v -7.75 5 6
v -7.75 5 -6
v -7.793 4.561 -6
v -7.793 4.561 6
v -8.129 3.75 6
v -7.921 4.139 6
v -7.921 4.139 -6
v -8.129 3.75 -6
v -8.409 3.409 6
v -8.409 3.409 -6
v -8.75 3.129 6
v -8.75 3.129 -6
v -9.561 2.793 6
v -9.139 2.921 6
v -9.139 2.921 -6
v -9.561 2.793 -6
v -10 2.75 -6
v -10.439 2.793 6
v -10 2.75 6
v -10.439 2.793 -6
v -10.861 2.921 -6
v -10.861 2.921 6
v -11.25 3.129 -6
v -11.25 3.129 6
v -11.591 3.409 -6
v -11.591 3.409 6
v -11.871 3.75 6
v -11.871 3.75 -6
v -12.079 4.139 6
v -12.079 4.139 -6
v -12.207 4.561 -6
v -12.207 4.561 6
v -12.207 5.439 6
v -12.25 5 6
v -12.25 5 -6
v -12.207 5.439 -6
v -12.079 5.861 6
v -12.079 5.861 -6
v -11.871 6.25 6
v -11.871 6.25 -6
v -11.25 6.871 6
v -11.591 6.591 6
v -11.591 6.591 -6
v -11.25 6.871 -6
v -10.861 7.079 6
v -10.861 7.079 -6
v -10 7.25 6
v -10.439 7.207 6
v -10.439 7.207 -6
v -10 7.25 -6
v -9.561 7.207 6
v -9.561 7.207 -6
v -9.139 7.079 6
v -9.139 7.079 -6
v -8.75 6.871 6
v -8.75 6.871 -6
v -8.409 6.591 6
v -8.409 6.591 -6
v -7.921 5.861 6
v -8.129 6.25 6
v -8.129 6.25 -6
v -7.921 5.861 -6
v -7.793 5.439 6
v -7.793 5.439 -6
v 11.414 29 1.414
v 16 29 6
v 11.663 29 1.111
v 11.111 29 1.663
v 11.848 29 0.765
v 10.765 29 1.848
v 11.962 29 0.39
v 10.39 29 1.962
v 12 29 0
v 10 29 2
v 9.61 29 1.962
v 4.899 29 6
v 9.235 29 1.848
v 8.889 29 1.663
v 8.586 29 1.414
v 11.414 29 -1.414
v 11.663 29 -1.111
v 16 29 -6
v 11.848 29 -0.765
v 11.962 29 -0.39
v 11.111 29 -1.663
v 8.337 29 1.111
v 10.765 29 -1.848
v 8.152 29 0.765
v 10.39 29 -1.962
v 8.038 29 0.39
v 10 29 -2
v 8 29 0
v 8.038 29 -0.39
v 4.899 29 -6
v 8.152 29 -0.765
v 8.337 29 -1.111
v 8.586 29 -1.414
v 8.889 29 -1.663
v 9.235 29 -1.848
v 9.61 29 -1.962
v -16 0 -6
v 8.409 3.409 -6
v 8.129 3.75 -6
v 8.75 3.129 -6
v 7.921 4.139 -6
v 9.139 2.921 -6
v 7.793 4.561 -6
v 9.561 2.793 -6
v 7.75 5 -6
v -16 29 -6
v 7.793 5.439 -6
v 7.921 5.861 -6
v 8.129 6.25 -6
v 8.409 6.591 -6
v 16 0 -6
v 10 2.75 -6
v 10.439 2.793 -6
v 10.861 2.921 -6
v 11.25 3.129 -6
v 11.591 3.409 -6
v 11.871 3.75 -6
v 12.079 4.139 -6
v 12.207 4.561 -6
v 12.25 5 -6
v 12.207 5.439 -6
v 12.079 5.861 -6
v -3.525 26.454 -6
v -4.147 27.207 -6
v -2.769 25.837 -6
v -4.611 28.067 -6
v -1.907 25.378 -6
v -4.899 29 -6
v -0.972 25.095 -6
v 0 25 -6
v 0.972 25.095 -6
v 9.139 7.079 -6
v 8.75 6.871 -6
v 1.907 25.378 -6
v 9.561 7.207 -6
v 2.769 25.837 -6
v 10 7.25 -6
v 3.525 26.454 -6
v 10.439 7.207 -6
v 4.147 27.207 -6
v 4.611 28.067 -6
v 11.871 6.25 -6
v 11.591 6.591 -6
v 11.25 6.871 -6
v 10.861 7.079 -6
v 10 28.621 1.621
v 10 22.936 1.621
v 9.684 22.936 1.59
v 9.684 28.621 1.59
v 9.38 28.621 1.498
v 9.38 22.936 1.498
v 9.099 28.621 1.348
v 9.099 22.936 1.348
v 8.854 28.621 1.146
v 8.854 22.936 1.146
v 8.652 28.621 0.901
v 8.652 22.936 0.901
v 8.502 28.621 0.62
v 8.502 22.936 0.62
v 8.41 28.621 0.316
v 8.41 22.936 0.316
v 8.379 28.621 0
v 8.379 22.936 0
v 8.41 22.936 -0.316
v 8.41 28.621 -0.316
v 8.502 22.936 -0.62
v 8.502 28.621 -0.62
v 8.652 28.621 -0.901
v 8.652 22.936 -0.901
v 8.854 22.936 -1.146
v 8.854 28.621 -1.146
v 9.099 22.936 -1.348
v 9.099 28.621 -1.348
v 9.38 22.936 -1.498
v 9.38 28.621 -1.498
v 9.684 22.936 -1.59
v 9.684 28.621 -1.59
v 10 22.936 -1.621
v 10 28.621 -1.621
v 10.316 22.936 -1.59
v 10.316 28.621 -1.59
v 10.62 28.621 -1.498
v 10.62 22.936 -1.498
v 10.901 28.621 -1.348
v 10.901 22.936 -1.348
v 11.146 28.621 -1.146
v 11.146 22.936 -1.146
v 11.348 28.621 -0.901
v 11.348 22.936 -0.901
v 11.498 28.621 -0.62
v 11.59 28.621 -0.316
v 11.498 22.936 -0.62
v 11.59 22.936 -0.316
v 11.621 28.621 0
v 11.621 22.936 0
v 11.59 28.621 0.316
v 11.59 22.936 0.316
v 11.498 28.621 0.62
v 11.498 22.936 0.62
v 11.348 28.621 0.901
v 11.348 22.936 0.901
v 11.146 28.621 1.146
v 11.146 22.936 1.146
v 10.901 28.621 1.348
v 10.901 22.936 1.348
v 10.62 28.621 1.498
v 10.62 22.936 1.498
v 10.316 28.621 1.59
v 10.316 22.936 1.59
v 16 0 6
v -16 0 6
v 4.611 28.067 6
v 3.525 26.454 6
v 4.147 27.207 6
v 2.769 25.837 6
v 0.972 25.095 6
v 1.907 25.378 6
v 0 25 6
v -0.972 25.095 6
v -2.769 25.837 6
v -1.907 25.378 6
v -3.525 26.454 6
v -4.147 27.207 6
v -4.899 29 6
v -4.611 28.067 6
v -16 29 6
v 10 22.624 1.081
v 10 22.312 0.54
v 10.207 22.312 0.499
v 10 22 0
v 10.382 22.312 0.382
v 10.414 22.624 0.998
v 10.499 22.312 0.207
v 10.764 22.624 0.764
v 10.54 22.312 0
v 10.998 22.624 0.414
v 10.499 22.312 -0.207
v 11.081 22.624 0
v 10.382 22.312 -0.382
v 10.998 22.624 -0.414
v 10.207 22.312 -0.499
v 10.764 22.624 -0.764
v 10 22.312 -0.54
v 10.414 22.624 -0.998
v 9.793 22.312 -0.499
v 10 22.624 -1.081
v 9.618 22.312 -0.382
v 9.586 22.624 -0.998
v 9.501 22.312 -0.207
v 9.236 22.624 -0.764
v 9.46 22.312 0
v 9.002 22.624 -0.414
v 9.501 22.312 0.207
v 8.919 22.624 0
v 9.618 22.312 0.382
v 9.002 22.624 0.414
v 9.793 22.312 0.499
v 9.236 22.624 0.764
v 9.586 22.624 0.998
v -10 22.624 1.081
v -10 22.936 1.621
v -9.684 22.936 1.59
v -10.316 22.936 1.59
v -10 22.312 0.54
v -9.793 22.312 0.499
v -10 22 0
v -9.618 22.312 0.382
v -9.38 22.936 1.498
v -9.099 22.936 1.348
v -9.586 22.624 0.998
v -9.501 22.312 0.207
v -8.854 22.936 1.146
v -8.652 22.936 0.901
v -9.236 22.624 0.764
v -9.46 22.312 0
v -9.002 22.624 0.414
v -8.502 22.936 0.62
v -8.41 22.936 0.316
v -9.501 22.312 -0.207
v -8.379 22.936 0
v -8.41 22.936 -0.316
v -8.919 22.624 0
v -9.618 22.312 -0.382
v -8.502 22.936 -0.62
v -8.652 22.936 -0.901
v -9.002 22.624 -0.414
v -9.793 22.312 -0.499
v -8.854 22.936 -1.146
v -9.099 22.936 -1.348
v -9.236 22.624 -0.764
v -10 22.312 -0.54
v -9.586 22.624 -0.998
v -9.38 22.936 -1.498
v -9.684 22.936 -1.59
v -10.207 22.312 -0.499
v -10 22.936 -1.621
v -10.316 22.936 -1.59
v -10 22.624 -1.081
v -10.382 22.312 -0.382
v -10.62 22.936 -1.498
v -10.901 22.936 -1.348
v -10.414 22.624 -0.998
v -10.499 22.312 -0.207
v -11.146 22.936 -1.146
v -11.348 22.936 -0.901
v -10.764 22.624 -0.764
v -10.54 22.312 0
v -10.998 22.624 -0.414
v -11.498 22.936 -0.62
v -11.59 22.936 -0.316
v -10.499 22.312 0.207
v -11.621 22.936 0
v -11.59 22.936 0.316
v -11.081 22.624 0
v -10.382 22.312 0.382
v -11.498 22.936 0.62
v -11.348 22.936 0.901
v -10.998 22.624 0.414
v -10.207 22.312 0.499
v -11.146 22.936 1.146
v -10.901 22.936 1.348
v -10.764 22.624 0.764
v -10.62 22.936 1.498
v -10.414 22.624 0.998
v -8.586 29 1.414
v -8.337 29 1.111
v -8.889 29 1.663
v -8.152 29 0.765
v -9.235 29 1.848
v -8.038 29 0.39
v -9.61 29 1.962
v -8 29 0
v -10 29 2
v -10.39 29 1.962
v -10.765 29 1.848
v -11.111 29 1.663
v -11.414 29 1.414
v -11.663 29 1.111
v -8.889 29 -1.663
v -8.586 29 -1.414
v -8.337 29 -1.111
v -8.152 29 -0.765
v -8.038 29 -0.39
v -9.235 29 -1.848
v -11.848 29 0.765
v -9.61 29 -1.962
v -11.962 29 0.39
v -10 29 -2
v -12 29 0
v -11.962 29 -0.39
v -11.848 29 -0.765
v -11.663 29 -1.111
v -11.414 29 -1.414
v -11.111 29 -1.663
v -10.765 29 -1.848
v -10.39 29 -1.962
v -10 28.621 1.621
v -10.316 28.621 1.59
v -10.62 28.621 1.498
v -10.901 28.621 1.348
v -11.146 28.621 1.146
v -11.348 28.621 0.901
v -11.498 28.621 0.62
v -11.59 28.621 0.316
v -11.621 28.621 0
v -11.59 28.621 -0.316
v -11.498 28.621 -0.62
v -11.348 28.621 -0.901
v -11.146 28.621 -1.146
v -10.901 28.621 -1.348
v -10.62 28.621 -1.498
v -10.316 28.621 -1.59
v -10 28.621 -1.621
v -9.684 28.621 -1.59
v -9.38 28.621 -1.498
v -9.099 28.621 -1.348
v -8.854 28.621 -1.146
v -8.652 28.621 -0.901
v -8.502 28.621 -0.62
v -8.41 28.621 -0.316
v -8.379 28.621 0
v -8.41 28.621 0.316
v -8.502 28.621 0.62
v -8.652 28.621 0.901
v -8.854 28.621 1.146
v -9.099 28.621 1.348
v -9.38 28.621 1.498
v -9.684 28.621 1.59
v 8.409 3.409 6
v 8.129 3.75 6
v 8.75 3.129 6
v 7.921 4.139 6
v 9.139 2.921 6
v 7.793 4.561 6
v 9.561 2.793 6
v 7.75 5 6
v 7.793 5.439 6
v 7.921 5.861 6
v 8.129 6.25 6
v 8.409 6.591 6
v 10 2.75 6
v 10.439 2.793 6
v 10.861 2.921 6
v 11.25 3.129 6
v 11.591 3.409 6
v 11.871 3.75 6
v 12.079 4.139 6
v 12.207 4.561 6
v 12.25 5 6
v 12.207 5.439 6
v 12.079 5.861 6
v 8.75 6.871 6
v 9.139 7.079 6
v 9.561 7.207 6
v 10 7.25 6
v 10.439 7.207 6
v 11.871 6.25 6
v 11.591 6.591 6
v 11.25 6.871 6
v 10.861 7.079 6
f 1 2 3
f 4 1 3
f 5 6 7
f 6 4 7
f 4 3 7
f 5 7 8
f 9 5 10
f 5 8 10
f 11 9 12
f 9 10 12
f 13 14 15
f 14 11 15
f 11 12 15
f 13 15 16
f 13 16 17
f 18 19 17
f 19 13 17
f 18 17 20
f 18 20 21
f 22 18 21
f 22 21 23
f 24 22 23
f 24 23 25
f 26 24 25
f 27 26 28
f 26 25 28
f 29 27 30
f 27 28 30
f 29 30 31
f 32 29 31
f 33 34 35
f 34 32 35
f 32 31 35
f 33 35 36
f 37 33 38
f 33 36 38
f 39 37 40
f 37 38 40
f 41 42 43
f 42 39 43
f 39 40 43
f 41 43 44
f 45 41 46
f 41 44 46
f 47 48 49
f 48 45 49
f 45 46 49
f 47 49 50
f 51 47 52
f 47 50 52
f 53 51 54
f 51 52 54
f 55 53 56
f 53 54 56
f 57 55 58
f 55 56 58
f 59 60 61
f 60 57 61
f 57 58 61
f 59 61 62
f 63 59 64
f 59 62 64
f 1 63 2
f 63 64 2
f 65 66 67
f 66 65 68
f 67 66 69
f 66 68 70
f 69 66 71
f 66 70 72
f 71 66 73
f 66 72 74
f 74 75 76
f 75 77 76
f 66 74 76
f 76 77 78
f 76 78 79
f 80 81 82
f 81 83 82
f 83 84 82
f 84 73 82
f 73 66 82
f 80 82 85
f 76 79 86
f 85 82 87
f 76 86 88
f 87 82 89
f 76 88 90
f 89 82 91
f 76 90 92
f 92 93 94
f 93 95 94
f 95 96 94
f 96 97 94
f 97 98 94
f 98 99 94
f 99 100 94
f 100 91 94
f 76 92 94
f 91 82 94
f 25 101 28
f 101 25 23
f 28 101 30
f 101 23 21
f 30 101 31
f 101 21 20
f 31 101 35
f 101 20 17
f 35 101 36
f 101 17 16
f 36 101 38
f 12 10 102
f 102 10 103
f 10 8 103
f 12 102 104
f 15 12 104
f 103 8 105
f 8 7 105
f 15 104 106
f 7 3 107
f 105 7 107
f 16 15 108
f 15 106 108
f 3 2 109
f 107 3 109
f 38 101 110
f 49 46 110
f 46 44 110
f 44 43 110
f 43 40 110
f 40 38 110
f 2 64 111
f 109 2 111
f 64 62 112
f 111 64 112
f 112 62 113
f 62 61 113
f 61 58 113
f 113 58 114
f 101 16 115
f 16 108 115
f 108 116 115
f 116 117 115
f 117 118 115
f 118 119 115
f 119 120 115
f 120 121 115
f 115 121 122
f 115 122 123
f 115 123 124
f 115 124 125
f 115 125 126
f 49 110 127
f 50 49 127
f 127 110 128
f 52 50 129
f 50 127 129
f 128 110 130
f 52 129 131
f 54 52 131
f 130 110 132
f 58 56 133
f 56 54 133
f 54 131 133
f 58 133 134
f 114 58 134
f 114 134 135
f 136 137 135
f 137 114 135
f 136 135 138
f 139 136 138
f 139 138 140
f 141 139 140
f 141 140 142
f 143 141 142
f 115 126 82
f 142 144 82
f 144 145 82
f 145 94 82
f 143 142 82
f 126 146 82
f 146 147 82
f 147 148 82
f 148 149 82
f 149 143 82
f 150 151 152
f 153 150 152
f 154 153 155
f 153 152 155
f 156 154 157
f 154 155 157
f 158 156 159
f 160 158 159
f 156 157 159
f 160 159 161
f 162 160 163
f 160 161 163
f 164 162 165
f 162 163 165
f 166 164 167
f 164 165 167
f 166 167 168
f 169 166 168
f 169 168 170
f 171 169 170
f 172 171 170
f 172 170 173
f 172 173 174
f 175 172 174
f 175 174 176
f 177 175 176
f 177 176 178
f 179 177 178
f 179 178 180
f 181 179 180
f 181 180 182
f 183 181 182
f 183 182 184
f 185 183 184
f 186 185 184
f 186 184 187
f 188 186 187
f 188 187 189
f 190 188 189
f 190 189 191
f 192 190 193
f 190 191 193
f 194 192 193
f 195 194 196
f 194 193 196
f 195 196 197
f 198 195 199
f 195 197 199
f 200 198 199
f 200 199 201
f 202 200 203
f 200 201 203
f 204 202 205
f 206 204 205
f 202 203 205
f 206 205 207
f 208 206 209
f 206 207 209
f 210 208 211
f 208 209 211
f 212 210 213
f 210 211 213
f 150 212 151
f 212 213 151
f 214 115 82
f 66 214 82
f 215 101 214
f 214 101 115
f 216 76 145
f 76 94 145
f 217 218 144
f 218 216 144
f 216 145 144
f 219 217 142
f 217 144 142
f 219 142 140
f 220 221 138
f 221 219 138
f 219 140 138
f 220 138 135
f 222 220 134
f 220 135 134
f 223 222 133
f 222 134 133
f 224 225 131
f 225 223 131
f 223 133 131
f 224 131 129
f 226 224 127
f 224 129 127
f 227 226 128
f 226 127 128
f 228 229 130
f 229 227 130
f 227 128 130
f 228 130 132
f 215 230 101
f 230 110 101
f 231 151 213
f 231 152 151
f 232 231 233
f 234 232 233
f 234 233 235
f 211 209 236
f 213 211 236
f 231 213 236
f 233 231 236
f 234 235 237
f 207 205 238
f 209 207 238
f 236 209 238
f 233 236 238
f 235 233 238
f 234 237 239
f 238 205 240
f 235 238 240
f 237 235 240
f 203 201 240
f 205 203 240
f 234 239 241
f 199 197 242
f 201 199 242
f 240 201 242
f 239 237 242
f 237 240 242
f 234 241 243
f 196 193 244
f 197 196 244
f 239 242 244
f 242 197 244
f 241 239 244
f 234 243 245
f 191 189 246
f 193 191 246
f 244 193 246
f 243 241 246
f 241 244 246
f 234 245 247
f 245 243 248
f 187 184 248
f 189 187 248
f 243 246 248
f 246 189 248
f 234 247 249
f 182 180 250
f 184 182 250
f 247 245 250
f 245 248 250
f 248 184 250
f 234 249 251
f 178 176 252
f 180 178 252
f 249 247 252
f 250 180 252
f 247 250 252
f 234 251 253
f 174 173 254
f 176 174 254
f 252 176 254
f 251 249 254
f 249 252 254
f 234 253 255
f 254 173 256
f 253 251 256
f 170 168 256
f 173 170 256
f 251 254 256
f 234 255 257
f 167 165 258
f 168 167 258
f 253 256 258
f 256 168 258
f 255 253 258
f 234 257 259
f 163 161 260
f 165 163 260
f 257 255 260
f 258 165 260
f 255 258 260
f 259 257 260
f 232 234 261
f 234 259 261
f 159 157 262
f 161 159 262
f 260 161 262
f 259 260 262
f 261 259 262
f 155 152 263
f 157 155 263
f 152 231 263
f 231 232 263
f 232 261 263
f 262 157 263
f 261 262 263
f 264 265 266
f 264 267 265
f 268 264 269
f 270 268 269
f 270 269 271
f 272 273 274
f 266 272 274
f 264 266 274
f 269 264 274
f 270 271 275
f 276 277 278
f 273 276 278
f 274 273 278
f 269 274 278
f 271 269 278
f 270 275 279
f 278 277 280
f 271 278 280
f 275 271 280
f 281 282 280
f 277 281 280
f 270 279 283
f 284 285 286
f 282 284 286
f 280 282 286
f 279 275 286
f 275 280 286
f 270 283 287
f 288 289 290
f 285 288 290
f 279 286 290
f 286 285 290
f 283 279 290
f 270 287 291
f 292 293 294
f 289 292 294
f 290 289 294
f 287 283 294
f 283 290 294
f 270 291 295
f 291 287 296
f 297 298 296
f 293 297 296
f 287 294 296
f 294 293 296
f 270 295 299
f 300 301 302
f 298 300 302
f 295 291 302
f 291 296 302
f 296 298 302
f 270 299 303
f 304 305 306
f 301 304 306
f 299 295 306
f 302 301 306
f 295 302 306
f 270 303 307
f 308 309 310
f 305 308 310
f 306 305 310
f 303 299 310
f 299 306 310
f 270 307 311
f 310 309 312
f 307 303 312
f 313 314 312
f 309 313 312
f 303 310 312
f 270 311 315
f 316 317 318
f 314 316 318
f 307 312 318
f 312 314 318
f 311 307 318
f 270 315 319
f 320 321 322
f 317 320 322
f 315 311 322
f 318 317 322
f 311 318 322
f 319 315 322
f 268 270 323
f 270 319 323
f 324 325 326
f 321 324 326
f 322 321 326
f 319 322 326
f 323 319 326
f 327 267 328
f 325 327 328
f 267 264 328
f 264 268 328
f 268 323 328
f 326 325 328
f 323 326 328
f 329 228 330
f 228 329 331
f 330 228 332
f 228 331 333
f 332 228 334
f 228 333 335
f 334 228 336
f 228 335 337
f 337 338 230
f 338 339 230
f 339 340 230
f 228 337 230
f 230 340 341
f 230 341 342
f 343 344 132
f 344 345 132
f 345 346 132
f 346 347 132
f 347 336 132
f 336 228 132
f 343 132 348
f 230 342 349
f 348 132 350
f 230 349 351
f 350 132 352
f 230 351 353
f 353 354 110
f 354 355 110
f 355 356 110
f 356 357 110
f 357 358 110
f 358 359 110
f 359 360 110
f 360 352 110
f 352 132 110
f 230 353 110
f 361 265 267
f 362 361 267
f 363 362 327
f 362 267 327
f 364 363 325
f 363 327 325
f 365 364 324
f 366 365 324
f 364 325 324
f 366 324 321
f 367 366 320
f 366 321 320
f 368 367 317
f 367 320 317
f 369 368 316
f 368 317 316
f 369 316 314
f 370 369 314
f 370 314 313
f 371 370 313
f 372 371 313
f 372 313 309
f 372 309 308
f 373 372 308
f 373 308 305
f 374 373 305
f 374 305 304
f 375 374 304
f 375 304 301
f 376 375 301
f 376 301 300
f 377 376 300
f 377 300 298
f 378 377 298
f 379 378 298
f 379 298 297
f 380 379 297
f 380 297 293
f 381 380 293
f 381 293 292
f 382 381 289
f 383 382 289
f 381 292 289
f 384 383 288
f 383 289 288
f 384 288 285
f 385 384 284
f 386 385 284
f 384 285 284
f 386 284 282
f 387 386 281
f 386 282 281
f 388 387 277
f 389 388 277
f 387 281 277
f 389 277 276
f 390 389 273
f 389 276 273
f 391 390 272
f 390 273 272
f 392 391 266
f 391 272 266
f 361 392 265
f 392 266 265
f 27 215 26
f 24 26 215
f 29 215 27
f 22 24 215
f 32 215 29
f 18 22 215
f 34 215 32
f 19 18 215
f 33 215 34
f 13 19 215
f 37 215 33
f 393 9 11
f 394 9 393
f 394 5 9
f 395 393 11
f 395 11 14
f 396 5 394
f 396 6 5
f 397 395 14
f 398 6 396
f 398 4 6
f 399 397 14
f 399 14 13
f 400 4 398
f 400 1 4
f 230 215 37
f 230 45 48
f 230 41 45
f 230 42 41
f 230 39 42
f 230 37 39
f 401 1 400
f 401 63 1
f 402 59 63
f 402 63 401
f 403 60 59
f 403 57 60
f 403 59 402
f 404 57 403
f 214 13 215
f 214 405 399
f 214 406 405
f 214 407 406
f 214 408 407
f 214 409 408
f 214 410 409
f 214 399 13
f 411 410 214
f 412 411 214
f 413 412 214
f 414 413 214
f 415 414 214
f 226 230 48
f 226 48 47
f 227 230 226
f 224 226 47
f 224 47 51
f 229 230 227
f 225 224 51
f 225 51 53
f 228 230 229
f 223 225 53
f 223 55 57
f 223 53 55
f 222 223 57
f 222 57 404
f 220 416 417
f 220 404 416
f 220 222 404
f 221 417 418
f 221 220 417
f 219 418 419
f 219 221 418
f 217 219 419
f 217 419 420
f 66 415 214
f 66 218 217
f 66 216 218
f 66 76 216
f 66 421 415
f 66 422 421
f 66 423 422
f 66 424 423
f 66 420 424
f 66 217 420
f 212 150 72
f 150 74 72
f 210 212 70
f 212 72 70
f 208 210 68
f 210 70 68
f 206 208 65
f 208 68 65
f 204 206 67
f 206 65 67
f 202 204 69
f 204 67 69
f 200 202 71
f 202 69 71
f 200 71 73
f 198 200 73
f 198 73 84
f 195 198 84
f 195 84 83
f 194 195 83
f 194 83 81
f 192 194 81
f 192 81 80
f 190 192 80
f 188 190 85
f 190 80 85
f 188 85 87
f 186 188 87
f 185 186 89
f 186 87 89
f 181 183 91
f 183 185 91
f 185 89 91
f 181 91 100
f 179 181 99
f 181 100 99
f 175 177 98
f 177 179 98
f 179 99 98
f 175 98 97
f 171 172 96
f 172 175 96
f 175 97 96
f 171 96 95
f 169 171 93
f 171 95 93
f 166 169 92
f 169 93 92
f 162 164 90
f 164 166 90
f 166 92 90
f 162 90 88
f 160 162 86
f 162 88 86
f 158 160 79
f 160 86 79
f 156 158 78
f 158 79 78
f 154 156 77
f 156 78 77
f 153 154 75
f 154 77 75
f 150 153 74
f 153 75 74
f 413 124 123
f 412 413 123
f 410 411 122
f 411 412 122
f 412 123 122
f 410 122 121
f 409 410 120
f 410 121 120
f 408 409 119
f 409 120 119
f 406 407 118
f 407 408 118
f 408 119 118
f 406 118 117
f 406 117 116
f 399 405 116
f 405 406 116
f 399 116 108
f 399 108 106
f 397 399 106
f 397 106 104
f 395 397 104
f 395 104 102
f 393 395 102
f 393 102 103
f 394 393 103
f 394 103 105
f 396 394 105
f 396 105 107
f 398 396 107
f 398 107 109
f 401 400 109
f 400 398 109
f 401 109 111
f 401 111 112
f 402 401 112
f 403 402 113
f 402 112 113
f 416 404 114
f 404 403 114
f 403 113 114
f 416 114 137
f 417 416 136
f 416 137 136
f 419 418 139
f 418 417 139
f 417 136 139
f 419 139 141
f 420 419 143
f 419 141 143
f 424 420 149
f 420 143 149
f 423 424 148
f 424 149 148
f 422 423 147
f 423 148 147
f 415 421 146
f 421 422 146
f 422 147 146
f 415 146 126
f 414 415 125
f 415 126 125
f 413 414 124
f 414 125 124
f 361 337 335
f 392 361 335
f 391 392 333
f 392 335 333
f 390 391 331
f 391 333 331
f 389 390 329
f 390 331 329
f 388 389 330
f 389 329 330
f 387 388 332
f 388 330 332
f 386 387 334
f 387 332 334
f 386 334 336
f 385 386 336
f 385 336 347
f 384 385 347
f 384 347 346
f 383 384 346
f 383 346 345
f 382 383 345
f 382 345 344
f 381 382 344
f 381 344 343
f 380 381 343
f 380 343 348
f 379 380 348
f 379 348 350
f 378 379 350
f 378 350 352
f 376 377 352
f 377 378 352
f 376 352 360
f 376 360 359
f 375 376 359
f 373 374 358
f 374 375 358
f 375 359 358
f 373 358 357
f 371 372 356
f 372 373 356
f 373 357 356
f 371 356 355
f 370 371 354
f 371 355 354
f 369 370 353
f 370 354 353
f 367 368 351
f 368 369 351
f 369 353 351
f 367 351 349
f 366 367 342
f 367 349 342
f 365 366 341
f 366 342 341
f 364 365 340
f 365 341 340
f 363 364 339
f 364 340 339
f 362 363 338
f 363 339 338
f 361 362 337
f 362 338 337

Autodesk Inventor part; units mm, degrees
sketch "Sketch_10" plane through (0, 0, 0) normal (0, 0, 1) x (1, 0, 0)
  line L0 (-16, 29) -> (-16, 0)
  line L1 (-16, 0) -> (16, 0)
  line L2 (16, 0) -> (16, 29)
  line L3 (16, 29) -> (4.899, 29)
  arc A0 (-4.899, 29) -> (4.899, 29) centre (0, 30) ccw
  line L4 (-4.899, 29) -> (-16, 29)
extrude "Extrusion1" add sketch "Sketch_10" along normal mid plane 12
sketch "Sketch2" plane through (4.899, 29, 6) normal (0, 1, 0) x (1, 0, 0)
  point P0 (5.101, 6)
hole "Hole1" at (10, 29, 0) direction (0, -1, 0) diameter 3.242 depth 6.0641 tip angle 120 countersink diameter 4 countersink angle 90 thread size "M4x0.7" class "6H" standard "ISO Metric profile"
sketch "Sketch3" plane through (-16, 29, 6) normal (0, 1, 0) x (1, 0, 0)
  point P0 (6, 6)
hole "Hole2" at (-10, 29, 0) direction (0, -1, 0) diameter 3.242 depth 6.0641 tip angle 120 countersink diameter 4 countersink angle 90 thread size "M4x0.7" class "6H" standard "ISO Metric profile"
sketch "Sketch_2" plane through (0, 0, 0) normal (0, 0, 1) x (1, 0, 0)
  circle A0 centre (10, 5) radius 2.25
extrude "Extrusion2" cut sketch "Sketch_2" along normal mid plane 12
sketch "Sketch_3" plane through (0, 0, 0) normal (0, 0, 1) x (1, 0, 0)
  circle A0 centre (-10, 5) radius 2.25
extrude "Extrusion3" cut sketch "Sketch_3" along normal mid plane 12
ref_plane "bolt2_to_body_XY" through (-10, 35.5, 0) normal (0, 1, 0) x (1, 0, 0)
ref_plane "bolt2_to_body_YZ" through (-10, 35.5, 0) normal (1, 0, 0) x (0, 0, -1)
ref_plane "bolt2_to_body_ZX" through (-10, 35.5, 0) normal (0, 0, -1) x (0, 1, 0)
ref_plane "bolt_to_body_XY" through (10, 35.5, 0) normal (0, 1, 0) x (1, 0, 0)
ref_plane "bolt_to_body_YZ" through (10, 35.5, 0) normal (1, 0, 0) x (0, 0, -1)
ref_plane "bolt_to_body_ZX" through (10, 35.5, 0) normal (0, 0, -1) x (0, 1, 0)
ref_plane "p_to_body_XY" through (0, 0, 0) normal (0, 1, 0) x (1, 0, 0)
ref_plane "p_to_body_YZ" through (0, 0, 0) normal (1, 0, 0) x (0, 0, -1)
ref_plane "p_to_body_ZX" through (0, 0, 0) normal (0, 0, -1) x (0, 1, 0)
properties part number "SHZA10-30_b"
